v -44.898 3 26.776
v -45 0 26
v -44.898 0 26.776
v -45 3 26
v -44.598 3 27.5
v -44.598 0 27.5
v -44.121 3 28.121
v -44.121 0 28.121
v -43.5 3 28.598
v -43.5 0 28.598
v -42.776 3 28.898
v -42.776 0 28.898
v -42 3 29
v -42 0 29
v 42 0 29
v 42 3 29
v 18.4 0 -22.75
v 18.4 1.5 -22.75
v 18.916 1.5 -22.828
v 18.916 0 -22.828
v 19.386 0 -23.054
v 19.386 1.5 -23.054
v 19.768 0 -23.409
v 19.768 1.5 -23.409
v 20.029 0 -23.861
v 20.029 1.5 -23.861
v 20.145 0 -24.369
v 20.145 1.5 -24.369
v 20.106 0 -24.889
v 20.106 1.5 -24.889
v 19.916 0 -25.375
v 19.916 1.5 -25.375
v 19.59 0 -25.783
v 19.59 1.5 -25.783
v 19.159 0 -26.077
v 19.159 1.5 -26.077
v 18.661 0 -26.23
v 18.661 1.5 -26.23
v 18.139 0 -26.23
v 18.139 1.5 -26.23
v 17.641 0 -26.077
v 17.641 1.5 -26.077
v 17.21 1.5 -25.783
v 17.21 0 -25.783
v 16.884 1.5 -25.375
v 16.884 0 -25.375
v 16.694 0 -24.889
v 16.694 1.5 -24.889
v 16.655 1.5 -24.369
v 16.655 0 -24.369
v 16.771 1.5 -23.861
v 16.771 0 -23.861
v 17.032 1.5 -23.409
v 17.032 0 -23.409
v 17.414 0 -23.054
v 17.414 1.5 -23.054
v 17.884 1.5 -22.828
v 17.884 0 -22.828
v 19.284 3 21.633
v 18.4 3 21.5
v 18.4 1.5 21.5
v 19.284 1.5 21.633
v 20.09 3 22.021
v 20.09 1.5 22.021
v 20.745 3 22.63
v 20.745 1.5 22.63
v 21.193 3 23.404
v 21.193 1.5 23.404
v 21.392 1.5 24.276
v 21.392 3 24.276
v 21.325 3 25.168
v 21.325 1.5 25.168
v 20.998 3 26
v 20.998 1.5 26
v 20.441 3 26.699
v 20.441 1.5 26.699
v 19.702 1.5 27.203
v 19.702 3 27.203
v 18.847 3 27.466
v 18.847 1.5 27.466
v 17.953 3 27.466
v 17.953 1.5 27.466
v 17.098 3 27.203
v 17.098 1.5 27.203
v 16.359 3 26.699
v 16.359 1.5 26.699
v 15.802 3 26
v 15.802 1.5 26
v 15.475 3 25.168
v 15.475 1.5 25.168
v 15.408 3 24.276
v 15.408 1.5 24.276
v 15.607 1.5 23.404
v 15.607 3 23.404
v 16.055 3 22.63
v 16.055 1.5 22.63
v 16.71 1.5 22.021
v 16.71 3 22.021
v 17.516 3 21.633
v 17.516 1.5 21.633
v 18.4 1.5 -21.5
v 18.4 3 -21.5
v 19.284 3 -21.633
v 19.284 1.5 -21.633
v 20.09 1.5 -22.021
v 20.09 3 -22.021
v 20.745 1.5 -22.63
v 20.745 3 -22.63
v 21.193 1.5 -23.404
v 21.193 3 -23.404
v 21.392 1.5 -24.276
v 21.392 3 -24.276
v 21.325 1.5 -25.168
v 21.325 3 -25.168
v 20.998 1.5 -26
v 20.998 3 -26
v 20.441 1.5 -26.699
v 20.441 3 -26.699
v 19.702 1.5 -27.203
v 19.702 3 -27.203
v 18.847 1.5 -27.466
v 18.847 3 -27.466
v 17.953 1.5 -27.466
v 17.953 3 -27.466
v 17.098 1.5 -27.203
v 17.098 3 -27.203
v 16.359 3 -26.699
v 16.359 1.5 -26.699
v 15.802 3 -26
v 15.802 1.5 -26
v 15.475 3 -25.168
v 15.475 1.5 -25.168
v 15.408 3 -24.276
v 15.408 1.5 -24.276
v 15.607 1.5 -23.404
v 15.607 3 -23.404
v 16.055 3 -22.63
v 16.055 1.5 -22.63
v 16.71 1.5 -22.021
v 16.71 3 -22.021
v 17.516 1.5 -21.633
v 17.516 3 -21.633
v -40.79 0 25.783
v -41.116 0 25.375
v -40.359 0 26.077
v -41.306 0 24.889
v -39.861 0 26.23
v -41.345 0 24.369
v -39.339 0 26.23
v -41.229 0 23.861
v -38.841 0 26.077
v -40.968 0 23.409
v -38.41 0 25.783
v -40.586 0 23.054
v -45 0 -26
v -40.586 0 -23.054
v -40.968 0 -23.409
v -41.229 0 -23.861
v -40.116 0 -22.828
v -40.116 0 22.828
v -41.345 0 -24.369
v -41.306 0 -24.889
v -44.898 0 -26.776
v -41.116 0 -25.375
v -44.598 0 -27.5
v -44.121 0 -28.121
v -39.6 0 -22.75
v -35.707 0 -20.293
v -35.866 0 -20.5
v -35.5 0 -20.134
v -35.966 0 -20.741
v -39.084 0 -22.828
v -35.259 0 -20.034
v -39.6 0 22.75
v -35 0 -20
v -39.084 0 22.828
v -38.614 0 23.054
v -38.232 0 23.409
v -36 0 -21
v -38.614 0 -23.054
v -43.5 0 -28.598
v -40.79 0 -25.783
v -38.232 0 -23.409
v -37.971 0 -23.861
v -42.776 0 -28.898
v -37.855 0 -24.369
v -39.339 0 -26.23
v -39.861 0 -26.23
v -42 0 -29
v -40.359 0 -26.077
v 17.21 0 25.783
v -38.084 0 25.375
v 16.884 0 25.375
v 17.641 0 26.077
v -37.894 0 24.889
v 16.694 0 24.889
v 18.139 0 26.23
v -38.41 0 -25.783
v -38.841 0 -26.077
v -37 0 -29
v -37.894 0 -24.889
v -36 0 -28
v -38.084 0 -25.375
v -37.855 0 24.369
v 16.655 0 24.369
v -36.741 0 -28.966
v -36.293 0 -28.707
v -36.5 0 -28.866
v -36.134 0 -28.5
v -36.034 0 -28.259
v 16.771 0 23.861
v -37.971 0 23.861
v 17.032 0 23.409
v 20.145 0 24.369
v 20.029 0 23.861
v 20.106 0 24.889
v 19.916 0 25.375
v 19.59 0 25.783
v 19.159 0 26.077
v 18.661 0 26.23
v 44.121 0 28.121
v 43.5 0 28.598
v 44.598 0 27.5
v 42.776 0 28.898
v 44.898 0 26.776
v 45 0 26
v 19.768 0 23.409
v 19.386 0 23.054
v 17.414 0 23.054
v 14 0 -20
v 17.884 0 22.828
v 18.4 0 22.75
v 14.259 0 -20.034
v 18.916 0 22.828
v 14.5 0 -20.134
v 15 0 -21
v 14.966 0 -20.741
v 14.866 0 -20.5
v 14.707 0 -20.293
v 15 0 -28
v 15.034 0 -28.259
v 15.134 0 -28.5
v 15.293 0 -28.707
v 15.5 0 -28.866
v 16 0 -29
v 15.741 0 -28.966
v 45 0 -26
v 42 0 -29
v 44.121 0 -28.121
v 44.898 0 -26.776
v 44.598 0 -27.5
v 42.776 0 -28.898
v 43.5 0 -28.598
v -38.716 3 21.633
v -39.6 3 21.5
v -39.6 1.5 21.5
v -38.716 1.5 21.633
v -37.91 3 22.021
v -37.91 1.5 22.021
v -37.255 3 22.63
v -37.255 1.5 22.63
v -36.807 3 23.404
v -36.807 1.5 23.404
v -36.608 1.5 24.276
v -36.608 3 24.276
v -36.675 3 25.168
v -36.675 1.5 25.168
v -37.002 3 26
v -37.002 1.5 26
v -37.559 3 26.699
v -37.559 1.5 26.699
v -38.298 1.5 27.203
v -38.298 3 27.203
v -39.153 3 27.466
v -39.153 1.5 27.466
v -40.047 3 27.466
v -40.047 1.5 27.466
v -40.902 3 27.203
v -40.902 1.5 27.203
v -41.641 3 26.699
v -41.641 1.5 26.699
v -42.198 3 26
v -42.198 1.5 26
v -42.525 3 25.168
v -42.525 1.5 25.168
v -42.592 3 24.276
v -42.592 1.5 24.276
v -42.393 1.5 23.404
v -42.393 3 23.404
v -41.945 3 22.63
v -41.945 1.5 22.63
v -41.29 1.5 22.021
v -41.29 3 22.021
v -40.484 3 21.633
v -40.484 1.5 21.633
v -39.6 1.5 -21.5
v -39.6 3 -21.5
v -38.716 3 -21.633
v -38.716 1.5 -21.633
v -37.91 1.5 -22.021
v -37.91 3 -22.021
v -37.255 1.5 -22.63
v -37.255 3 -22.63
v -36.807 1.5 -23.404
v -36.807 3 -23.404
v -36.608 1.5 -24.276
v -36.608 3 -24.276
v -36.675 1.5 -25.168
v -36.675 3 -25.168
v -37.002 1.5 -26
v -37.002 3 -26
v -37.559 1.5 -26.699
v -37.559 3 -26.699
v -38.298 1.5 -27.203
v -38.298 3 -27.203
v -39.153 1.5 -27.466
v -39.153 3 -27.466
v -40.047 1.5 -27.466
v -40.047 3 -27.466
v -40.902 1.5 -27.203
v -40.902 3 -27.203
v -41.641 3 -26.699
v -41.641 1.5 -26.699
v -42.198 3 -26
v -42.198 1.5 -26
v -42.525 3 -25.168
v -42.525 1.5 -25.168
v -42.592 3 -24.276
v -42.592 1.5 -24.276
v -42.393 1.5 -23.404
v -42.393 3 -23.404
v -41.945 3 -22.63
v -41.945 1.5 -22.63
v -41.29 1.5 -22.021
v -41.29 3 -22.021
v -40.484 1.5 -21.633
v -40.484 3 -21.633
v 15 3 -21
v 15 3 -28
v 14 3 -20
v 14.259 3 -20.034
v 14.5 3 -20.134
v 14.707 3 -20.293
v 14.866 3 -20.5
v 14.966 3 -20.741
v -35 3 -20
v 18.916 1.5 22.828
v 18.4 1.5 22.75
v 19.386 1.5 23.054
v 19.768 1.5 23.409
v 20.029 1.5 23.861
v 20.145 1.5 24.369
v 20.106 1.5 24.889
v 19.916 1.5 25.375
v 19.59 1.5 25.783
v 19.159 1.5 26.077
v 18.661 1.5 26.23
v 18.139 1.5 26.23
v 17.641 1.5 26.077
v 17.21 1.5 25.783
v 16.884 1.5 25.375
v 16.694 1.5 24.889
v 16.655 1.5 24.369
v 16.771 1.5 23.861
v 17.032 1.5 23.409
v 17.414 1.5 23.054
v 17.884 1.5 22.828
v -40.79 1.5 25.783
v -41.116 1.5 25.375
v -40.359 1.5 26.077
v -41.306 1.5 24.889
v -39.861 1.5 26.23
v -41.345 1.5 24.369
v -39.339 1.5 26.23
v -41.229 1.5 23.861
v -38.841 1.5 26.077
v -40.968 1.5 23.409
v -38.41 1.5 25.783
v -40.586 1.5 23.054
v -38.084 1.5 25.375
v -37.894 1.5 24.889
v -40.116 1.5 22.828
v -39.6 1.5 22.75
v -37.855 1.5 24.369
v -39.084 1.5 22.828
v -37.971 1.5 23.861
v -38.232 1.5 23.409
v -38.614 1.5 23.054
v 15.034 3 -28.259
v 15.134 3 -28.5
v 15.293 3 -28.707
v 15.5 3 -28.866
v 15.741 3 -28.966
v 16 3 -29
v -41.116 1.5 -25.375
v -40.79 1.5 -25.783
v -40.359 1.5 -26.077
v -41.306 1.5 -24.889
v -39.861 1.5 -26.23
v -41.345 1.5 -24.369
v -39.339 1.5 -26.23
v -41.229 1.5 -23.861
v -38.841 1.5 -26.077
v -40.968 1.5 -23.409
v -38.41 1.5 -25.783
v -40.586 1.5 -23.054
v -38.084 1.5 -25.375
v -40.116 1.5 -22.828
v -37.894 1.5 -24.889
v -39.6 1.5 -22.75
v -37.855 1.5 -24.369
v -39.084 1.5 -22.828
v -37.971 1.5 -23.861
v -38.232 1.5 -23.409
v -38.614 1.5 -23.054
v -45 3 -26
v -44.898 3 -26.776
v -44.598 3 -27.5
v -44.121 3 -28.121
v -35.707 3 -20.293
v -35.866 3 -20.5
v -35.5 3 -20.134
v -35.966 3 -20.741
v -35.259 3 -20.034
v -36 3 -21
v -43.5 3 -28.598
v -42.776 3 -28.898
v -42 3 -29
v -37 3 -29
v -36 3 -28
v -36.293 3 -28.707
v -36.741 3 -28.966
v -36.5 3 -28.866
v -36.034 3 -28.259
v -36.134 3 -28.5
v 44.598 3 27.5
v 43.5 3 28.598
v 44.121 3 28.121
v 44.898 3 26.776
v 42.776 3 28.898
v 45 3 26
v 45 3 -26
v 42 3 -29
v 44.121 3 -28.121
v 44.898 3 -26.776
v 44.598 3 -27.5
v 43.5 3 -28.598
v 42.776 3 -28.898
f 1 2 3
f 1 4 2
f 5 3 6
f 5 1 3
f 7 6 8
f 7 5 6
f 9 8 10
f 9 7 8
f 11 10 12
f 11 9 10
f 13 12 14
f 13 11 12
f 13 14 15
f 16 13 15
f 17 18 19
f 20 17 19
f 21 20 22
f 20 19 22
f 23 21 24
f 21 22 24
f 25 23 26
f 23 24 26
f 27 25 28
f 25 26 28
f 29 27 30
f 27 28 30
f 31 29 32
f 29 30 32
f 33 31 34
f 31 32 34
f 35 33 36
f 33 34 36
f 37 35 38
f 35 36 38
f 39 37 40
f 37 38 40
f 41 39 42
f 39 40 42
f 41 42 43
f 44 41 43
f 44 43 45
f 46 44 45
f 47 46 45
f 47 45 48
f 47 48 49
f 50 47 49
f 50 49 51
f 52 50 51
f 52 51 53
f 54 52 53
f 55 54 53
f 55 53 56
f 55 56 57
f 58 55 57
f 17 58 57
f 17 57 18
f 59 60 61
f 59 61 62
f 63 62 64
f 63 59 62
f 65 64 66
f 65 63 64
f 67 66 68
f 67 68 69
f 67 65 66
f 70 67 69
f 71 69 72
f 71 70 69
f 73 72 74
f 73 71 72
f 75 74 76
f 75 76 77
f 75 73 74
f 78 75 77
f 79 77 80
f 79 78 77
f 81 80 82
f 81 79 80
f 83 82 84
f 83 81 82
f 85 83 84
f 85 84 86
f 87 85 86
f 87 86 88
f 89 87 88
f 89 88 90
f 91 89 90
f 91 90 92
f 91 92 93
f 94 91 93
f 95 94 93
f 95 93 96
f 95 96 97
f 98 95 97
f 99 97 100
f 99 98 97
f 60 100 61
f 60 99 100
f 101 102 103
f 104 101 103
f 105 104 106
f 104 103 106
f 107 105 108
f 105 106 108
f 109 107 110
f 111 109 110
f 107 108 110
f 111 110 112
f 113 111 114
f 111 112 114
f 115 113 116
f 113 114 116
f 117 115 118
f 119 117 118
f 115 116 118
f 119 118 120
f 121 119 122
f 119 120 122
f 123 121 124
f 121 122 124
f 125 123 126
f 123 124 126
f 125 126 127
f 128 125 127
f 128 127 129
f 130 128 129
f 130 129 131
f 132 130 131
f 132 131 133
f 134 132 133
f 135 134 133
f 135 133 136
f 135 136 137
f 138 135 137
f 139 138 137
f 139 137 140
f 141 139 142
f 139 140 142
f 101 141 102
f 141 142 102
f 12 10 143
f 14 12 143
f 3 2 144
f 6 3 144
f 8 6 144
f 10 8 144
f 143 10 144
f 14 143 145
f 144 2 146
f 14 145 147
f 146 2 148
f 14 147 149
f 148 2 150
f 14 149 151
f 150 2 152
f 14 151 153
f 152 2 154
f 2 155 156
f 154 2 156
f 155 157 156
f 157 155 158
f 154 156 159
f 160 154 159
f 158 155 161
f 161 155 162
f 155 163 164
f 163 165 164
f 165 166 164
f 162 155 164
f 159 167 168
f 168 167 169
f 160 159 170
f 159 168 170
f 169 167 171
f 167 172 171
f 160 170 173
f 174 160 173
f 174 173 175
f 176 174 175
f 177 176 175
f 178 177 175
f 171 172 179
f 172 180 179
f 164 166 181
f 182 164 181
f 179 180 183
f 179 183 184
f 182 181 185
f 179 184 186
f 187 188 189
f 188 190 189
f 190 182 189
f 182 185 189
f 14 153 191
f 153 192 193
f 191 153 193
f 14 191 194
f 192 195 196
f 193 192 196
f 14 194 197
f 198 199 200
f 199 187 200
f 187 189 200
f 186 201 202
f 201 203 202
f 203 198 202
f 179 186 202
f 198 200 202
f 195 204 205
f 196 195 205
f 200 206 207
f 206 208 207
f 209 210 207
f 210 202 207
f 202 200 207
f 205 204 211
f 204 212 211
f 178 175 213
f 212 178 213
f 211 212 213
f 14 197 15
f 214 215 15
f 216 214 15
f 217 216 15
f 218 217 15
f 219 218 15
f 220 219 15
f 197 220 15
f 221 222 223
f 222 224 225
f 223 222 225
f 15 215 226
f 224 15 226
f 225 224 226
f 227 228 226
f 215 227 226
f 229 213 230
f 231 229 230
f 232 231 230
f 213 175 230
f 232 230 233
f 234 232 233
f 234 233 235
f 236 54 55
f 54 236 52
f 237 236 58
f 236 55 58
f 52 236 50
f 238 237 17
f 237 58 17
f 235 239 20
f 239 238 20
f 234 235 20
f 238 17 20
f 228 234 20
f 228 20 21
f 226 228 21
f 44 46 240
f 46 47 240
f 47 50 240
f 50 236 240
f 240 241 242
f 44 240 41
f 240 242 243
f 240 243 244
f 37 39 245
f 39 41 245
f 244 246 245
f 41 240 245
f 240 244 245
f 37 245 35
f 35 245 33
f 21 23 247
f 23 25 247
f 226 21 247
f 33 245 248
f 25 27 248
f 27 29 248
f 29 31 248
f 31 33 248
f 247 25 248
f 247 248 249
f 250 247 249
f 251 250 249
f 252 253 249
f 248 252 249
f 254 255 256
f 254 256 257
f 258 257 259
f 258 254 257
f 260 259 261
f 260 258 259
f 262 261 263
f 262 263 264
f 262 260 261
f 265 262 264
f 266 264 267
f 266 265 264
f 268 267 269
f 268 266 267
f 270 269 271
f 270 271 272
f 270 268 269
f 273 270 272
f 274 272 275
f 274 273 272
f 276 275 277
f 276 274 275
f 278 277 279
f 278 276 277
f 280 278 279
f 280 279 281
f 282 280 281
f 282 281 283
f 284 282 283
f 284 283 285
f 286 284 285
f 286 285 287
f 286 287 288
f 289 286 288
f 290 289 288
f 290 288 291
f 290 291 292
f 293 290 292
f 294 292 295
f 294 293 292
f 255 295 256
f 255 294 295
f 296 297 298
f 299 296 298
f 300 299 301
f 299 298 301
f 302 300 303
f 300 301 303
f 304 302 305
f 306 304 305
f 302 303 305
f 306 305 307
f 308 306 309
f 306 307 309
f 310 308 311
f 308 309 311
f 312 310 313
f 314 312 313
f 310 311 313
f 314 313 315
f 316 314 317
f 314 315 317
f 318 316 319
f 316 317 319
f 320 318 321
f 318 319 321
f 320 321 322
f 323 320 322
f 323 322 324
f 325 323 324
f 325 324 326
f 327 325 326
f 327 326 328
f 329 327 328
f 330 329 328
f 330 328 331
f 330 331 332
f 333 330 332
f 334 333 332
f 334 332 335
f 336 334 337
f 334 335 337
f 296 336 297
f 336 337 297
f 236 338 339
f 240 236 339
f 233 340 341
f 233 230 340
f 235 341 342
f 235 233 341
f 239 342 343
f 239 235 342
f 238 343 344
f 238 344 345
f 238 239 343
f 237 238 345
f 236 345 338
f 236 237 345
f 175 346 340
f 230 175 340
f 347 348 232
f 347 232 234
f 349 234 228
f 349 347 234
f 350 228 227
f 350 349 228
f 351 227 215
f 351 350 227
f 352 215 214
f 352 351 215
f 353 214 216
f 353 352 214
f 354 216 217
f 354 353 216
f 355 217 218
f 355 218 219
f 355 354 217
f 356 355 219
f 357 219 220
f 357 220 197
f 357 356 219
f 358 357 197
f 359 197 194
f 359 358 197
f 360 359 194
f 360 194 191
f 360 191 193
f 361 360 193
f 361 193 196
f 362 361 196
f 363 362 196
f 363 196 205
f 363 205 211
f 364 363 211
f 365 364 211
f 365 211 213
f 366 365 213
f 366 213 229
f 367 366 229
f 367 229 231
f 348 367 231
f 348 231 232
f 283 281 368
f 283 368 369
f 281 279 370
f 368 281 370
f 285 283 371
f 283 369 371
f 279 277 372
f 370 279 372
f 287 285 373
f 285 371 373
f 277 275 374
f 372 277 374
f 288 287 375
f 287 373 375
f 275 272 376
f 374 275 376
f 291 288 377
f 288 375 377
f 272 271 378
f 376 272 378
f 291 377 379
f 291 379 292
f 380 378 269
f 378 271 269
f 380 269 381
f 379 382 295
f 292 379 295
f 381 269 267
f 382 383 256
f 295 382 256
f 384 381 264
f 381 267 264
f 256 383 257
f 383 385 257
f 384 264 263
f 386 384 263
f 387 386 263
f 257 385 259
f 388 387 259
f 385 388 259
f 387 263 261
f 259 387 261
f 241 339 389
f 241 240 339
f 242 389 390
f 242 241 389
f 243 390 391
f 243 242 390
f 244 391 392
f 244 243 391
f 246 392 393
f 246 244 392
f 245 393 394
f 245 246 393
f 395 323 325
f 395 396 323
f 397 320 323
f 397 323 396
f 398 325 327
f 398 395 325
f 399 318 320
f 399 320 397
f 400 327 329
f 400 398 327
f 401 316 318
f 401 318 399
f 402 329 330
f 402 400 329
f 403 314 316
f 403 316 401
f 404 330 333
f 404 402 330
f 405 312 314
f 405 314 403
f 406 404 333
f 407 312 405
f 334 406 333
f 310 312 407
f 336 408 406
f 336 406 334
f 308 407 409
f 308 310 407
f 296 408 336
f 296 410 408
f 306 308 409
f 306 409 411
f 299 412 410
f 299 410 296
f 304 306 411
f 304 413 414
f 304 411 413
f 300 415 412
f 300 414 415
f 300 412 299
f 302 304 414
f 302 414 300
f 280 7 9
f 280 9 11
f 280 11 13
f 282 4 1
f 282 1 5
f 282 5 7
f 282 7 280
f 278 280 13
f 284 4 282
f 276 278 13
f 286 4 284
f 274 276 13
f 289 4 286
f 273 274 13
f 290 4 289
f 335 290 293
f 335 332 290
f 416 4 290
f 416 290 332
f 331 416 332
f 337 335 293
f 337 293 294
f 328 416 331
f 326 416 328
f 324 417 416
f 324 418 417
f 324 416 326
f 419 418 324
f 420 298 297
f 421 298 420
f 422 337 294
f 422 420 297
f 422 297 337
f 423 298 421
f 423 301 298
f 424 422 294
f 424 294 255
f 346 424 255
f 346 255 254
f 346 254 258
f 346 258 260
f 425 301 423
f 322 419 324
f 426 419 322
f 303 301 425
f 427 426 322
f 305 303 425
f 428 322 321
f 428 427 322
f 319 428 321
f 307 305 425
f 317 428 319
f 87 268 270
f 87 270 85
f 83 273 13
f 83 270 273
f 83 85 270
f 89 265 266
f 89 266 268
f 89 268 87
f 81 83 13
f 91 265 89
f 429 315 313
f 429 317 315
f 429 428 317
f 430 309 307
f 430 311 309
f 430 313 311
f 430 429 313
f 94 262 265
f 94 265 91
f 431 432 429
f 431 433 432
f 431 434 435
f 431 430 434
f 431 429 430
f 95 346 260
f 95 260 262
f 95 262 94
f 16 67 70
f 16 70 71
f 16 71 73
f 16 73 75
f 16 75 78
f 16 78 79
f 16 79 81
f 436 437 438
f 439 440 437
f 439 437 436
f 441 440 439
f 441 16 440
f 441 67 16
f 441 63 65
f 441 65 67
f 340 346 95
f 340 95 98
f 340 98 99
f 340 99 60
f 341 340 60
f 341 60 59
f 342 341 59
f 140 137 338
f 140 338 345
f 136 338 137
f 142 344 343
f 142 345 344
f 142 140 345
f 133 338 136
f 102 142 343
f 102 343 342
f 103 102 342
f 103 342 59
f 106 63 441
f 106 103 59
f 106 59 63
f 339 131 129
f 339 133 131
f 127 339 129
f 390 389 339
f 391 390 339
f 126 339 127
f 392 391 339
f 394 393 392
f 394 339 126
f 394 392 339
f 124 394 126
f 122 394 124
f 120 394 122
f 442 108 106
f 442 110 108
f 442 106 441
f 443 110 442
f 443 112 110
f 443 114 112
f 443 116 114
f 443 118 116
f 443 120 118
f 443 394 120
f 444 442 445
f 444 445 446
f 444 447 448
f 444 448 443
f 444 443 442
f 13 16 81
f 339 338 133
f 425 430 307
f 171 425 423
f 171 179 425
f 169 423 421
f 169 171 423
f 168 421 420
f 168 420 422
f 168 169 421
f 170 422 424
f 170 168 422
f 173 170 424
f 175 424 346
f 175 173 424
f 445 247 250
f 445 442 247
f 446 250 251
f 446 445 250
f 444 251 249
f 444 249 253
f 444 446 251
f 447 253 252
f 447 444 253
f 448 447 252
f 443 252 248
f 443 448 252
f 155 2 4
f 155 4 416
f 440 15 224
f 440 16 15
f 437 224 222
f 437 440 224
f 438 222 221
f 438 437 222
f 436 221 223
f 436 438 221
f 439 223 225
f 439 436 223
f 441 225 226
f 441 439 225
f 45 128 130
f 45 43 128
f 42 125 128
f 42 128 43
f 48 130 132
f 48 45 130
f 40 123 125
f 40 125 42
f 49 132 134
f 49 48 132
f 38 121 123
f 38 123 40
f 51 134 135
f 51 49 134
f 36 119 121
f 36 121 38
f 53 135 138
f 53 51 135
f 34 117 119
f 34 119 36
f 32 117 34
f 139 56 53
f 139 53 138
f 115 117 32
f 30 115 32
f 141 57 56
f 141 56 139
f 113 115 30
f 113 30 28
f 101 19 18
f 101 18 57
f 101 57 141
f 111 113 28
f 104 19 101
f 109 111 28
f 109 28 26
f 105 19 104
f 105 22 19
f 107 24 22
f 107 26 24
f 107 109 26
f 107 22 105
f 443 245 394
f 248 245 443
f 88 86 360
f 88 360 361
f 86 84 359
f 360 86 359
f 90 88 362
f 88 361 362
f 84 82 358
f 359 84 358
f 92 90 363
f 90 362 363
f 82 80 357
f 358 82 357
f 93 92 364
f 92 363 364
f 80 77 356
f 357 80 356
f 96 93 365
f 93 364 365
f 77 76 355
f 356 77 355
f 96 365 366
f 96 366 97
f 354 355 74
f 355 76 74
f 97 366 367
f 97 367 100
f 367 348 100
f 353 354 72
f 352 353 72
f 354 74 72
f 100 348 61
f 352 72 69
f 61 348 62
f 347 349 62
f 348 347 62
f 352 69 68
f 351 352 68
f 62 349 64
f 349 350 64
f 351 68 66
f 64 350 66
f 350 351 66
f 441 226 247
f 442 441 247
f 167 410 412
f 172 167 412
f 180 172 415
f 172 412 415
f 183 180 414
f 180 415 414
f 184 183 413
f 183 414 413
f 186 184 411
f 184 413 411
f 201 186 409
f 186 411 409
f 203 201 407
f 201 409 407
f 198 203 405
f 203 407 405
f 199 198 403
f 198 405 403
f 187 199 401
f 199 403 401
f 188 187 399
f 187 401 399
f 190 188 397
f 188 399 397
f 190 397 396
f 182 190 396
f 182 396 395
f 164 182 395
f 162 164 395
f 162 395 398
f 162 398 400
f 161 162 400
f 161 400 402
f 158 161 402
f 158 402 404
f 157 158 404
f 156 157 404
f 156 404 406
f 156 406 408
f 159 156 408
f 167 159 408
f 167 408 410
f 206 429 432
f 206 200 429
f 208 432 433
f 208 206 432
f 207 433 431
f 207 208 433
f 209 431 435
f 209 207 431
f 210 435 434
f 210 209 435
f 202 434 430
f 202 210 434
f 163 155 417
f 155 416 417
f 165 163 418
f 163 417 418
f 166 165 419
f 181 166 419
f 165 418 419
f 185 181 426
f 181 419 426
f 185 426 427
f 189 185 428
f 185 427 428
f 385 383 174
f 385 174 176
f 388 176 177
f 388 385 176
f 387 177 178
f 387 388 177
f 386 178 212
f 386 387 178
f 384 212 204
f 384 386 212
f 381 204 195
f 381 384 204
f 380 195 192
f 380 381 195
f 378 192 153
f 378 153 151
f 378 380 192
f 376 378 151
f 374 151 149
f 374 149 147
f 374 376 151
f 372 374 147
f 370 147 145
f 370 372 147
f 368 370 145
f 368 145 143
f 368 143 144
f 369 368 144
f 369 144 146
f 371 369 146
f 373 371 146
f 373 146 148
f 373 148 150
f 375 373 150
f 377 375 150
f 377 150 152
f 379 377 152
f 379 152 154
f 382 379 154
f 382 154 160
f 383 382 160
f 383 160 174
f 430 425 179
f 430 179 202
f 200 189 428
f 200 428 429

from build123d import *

# Parameters (mm, degrees)
SKETCH1_W           = 90
SKETCH1_H           = 58
BOSS_EXTRUDE1_DEPTH = 3
FILLET1_R           = 3
CUT_EXTRUDE1_REACH  = 55.619
SKETCH2_W           = 51
SKETCH2_H           = 9
FILLET3_R           = 1
CUT_EXTRUDE2_REACH  = 55.619
SKETCH3_R           = 1.75
SKETCH4_R           = 3
CUT_EXTRUDE4_DEPTH  = 1.5


with BuildPart() as part:
    # Sketch1 → Boss-Extrude1 (new body)
    with BuildSketch(Plane(origin=(0, 0, 0), x_dir=(1, 0, 0), z_dir=(0, 1, 0))):
        Rectangle(SKETCH1_W, SKETCH1_H)
    extrude(amount=BOSS_EXTRUDE1_DEPTH)

    # Fillet1
    fillet1_edges = [part.edges().sort_by_distance(p)[0] for p in [
        (-45, 1.5, -29),
        (45, 1.5, -29),
        (45, 1.5, 29),
        (-45, 1.5, 29),
    ]]
    fillet(fillet1_edges, radius=FILLET1_R)

    # Sketch2 → Cut-Extrude1 (cut, up to next)
    with BuildSketch(Plane(origin=(0, 3, 0), x_dir=(1, 0, 0), z_dir=(0, 1, 0)), mode=Mode.PRIVATE) as cut_extrude1_sk1:
        with Locations((-10.5, 24.5)):
            Rectangle(SKETCH2_W, SKETCH2_H)
    cut_extrude1_tool1 = extrude(cut_extrude1_sk1.sketch, amount=-CUT_EXTRUDE1_REACH, mode=Mode.PRIVATE) & part.part
    add(cut_extrude1_tool1.solids().sort_by_distance((-10.5, 3, -24.5))[0], mode=Mode.SUBTRACT)

    # Fillet3
    fillet3_edges = [part.edges().sort_by_distance(p)[0] for p in [
        (-36, 1.5, -20),
        (-36, 1.5, -29),
        (15, 1.5, -29),
        (15, 1.5, -20),
    ]]
    fillet(fillet3_edges, radius=FILLET3_R)

    # Sketch3 → Cut-Extrude2 (cut, up to next)
    with BuildSketch(Plane(origin=(0, 3, 0), x_dir=(1, 0, 0), z_dir=(0, 1, 0)), mode=Mode.PRIVATE) as cut_extrude2_sk1:
        with Locations(Location((-39.6, 24.5, 0), (0, 0, 270))):
            Circle(SKETCH3_R)
    cut_extrude2_tool1 = extrude(cut_extrude2_sk1.sketch, amount=-CUT_EXTRUDE2_REACH, mode=Mode.PRIVATE) & part.part
    # Sketch3 → Cut-Extrude2 (cut, up to next)
    with BuildSketch(Plane(origin=(0, 3, 0), x_dir=(1, 0, 0), z_dir=(0, 1, 0)), mode=Mode.PRIVATE) as cut_extrude2_sk2:
        with Locations(Location((18.4, 24.5, 0), (0, 0, 270))):
            Circle(SKETCH3_R)
    cut_extrude2_tool2 = extrude(cut_extrude2_sk2.sketch, amount=-CUT_EXTRUDE2_REACH, mode=Mode.PRIVATE) & part.part
    cut_extrude2_1 = cut_extrude2_tool1.solids().sort_by_distance((-39.6, 3, -24.5))[0]
    add(cut_extrude2_1, mode=Mode.SUBTRACT)
    cut_extrude2_2 = cut_extrude2_tool2.solids().sort_by_distance((18.4, 3, -24.5))[0]
    add(cut_extrude2_2, mode=Mode.SUBTRACT)
    cut_extrude2 = cut_extrude2_1 + cut_extrude2_2  # Cut-Extrude2 as one shape, for the pattern or mirror that repeats it

    # Mirror1: Cut-Extrude2 across plane
    add(cut_extrude2.mirror(Plane.XY), mode=Mode.SUBTRACT)

    # Sketch4 → Cut-Extrude4 (cut)
    with BuildSketch(Plane(origin=(0, 3, 0), x_dir=(1, 0, 0), z_dir=(0, 1, 0))):
        with Locations(Location((-39.6, 24.5, 0), (0, 0, 270))):
            Circle(SKETCH4_R)
        with Locations(Location((18.4, 24.5, 0), (0, 0, 270))):
            Circle(SKETCH4_R)
    cut_extrude4 = extrude(amount=-CUT_EXTRUDE4_DEPTH, mode=Mode.SUBTRACT)

    # Mirror2: Cut-Extrude4 across plane
    add(cut_extrude4.mirror(Plane.XY), mode=Mode.SUBTRACT)


solid = part.part
